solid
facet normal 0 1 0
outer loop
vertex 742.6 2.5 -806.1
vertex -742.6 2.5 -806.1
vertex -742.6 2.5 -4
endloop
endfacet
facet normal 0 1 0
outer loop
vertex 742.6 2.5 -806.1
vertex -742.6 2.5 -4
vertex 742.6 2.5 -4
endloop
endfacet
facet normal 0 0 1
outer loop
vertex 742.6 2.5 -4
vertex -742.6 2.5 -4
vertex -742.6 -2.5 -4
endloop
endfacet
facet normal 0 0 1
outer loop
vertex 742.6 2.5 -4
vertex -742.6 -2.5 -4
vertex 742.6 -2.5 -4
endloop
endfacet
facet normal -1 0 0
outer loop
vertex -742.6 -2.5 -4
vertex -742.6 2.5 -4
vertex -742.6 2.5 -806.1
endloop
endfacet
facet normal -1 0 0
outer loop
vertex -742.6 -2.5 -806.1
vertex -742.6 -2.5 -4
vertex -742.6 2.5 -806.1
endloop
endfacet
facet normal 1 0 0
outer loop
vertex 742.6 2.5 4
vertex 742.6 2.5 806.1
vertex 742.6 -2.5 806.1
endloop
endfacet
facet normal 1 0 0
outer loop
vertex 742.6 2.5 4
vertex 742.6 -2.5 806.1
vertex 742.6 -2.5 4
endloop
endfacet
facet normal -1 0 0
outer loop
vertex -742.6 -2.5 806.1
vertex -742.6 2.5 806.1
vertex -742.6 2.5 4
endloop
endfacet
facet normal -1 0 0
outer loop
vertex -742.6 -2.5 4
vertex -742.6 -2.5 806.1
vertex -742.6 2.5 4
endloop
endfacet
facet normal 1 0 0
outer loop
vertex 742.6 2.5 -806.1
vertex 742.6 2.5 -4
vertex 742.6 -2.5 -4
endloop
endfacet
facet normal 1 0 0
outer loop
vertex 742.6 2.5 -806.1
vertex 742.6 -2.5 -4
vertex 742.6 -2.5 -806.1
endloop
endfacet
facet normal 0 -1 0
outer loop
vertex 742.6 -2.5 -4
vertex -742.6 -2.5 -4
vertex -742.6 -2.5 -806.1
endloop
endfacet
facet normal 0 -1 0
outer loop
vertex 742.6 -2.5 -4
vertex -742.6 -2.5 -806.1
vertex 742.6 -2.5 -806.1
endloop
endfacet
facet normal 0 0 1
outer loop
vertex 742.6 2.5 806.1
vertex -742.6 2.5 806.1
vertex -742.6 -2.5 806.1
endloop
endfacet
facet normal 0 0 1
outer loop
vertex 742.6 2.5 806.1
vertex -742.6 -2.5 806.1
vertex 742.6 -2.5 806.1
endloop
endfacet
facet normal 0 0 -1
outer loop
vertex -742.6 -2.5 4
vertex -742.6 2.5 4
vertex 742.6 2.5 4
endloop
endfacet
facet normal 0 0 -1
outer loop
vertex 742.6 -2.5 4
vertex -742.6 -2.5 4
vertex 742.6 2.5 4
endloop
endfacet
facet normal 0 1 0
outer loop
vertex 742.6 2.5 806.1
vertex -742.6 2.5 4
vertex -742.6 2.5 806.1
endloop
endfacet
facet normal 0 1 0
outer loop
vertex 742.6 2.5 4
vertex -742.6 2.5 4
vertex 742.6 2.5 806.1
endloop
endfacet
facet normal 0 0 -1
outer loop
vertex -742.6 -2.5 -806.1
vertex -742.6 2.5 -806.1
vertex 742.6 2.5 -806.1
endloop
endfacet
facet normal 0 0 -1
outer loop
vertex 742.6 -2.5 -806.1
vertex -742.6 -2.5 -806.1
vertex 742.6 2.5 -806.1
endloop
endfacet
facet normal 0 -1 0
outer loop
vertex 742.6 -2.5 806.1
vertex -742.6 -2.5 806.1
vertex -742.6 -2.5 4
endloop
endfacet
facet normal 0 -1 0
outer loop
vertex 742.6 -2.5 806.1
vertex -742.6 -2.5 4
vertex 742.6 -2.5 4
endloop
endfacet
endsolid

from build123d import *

# Parameters (mm, degrees)
BOSS_EXTRUDE1_DEPTH             = 2.5
BOSS_EXTRUDE1_DEPTH_BACK        = 2.5
SKETCH1_W                       = 1473.2
SKETCH1_H                       = 790.1
BOSS_EXTRUDE1_2_DEPTH           = 2.5
BOSS_EXTRUDE1_2_DEPTH_BACK      = 2.5
BOSS_EXTRUDE2_REACH             = 1089.541
SKETCH2_W                       = 1485.2
SKETCH2_H                       = 802.1
SKETCH2_W_2                     = 1473.2
SKETCH2_H_2                     = 790.1
BOSS_EXTRUDE2_DIRECTION_2_REACH = 1089.541


with BuildPart() as part:
    # Sketch1 → Boss-Extrude1 (new, two sides: drawn at the far end of the back side and taken through both)
    with BuildSketch(Plane(origin=(0, 0, 0), x_dir=(1, 0, 0), z_dir=(0, 1, 0)).offset(-BOSS_EXTRUDE1_DEPTH_BACK)):
        with Locations((0, 405.05)):
            Rectangle(SKETCH1_W, SKETCH1_H)
    extrude(amount=BOSS_EXTRUDE1_DEPTH + BOSS_EXTRUDE1_DEPTH_BACK)

    # Boss-Extrude2: up to this face of the body (flat: up to its plane)
    boss_extrude2_end = Plane(part.part.faces().sort_by_distance((0, 2.5, -405.05))[0])
    # Sketch2 → Boss-Extrude2 (add, up to the picked face)
    with BuildSketch(Plane(origin=(0, 0, 0), x_dir=(1, 0, 0), z_dir=(0, 1, 0)), mode=Mode.PRIVATE) as boss_extrude2_sk1:
        with Locations((0, 405.05)):
            Rectangle(SKETCH2_W, SKETCH2_H)
        with Locations((0, 405.05)):
            Rectangle(SKETCH2_W_2, SKETCH2_H_2, mode=Mode.SUBTRACT)
    boss_extrude2_tool1 = split(extrude(boss_extrude2_sk1.sketch, amount=BOSS_EXTRUDE2_REACH, mode=Mode.PRIVATE), bisect_by=boss_extrude2_end, keep=Keep.BOTH, mode=Mode.PRIVATE)
    # Sketch2 → Boss-Extrude2 (add, up to the picked face)
    with BuildSketch(Plane(origin=(0, 0, 0), x_dir=(1, 0, 0), z_dir=(0, 1, 0)), mode=Mode.PRIVATE) as boss_extrude2_sk2:
        with Locations((0, -405.05)):
            Rectangle(SKETCH2_W, SKETCH2_H)
        with Locations((0, -405.05)):
            Rectangle(SKETCH2_W_2, SKETCH2_H_2, mode=Mode.SUBTRACT)
    boss_extrude2_tool2 = split(extrude(boss_extrude2_sk2.sketch, amount=BOSS_EXTRUDE2_REACH, mode=Mode.PRIVATE), bisect_by=boss_extrude2_end, keep=Keep.BOTH, mode=Mode.PRIVATE)


with BuildPart() as body_2:
    # Sketch1 → Boss-Extrude1 2 (new, two sides: drawn at the far end of the back side and taken through both)
    with BuildSketch(Plane(origin=(0, 0, 0), x_dir=(1, 0, 0), z_dir=(0, 1, 0)).offset(-BOSS_EXTRUDE1_2_DEPTH_BACK)):
        with Locations((0, -405.05)):
            Rectangle(SKETCH1_W, SKETCH1_H)
    extrude(amount=BOSS_EXTRUDE1_2_DEPTH + BOSS_EXTRUDE1_2_DEPTH_BACK)


with BuildPart() as part_1:
    add(part.part)

    add(body_2.part)  # Boss-Extrude2 merges body 2
    add(boss_extrude2_tool1.solids().sort_by(Axis((0, 0, -804.412048), (0, 1, 0)))[0])
    add(boss_extrude2_tool2.solids().sort_by(Axis((0, 0, 804.412048), (0, 1, 0)))[0])

    # Boss-Extrude2 direction 2: up to this face of the body (flat: up to its plane)
    boss_extrude2_direction_2_end = Plane(part_1.part.faces().sort_by_distance((0, -2.5, -405.05))[0])
    # Sketch2 → Boss-Extrude2 direction 2 (add, up to the picked face)
    with BuildSketch(Plane(origin=(0, 0, 0), x_dir=(1, 0, 0), z_dir=(0, 1, 0)), mode=Mode.PRIVATE) as boss_extrude2_direction_2_sk1:
        with Locations((0, 405.05)):
            Rectangle(SKETCH2_W, SKETCH2_H)
        with Locations((0, 405.05)):
            Rectangle(SKETCH2_W_2, SKETCH2_H_2, mode=Mode.SUBTRACT)
    boss_extrude2_direction_2_tool1 = split(extrude(boss_extrude2_direction_2_sk1.sketch, amount=-BOSS_EXTRUDE2_DIRECTION_2_REACH, mode=Mode.PRIVATE), bisect_by=boss_extrude2_direction_2_end, keep=Keep.BOTH, mode=Mode.PRIVATE)
    # Sketch2 → Boss-Extrude2 direction 2 (add, up to the picked face)
    with BuildSketch(Plane(origin=(0, 0, 0), x_dir=(1, 0, 0), z_dir=(0, 1, 0)), mode=Mode.PRIVATE) as boss_extrude2_direction_2_sk2:
        with Locations((0, -405.05)):
            Rectangle(SKETCH2_W, SKETCH2_H)
        with Locations((0, -405.05)):
            Rectangle(SKETCH2_W_2, SKETCH2_H_2, mode=Mode.SUBTRACT)
    boss_extrude2_direction_2_tool2 = split(extrude(boss_extrude2_direction_2_sk2.sketch, amount=-BOSS_EXTRUDE2_DIRECTION_2_REACH, mode=Mode.PRIVATE), bisect_by=boss_extrude2_direction_2_end, keep=Keep.BOTH, mode=Mode.PRIVATE)
    add(boss_extrude2_direction_2_tool1.solids().sort_by(Axis((0, 0, -804.412048), (0, -1, 0)))[0])
    add(boss_extrude2_direction_2_tool2.solids().sort_by(Axis((0, 0, 804.412048), (0, -1, 0)))[0])


solid = part_1.part
